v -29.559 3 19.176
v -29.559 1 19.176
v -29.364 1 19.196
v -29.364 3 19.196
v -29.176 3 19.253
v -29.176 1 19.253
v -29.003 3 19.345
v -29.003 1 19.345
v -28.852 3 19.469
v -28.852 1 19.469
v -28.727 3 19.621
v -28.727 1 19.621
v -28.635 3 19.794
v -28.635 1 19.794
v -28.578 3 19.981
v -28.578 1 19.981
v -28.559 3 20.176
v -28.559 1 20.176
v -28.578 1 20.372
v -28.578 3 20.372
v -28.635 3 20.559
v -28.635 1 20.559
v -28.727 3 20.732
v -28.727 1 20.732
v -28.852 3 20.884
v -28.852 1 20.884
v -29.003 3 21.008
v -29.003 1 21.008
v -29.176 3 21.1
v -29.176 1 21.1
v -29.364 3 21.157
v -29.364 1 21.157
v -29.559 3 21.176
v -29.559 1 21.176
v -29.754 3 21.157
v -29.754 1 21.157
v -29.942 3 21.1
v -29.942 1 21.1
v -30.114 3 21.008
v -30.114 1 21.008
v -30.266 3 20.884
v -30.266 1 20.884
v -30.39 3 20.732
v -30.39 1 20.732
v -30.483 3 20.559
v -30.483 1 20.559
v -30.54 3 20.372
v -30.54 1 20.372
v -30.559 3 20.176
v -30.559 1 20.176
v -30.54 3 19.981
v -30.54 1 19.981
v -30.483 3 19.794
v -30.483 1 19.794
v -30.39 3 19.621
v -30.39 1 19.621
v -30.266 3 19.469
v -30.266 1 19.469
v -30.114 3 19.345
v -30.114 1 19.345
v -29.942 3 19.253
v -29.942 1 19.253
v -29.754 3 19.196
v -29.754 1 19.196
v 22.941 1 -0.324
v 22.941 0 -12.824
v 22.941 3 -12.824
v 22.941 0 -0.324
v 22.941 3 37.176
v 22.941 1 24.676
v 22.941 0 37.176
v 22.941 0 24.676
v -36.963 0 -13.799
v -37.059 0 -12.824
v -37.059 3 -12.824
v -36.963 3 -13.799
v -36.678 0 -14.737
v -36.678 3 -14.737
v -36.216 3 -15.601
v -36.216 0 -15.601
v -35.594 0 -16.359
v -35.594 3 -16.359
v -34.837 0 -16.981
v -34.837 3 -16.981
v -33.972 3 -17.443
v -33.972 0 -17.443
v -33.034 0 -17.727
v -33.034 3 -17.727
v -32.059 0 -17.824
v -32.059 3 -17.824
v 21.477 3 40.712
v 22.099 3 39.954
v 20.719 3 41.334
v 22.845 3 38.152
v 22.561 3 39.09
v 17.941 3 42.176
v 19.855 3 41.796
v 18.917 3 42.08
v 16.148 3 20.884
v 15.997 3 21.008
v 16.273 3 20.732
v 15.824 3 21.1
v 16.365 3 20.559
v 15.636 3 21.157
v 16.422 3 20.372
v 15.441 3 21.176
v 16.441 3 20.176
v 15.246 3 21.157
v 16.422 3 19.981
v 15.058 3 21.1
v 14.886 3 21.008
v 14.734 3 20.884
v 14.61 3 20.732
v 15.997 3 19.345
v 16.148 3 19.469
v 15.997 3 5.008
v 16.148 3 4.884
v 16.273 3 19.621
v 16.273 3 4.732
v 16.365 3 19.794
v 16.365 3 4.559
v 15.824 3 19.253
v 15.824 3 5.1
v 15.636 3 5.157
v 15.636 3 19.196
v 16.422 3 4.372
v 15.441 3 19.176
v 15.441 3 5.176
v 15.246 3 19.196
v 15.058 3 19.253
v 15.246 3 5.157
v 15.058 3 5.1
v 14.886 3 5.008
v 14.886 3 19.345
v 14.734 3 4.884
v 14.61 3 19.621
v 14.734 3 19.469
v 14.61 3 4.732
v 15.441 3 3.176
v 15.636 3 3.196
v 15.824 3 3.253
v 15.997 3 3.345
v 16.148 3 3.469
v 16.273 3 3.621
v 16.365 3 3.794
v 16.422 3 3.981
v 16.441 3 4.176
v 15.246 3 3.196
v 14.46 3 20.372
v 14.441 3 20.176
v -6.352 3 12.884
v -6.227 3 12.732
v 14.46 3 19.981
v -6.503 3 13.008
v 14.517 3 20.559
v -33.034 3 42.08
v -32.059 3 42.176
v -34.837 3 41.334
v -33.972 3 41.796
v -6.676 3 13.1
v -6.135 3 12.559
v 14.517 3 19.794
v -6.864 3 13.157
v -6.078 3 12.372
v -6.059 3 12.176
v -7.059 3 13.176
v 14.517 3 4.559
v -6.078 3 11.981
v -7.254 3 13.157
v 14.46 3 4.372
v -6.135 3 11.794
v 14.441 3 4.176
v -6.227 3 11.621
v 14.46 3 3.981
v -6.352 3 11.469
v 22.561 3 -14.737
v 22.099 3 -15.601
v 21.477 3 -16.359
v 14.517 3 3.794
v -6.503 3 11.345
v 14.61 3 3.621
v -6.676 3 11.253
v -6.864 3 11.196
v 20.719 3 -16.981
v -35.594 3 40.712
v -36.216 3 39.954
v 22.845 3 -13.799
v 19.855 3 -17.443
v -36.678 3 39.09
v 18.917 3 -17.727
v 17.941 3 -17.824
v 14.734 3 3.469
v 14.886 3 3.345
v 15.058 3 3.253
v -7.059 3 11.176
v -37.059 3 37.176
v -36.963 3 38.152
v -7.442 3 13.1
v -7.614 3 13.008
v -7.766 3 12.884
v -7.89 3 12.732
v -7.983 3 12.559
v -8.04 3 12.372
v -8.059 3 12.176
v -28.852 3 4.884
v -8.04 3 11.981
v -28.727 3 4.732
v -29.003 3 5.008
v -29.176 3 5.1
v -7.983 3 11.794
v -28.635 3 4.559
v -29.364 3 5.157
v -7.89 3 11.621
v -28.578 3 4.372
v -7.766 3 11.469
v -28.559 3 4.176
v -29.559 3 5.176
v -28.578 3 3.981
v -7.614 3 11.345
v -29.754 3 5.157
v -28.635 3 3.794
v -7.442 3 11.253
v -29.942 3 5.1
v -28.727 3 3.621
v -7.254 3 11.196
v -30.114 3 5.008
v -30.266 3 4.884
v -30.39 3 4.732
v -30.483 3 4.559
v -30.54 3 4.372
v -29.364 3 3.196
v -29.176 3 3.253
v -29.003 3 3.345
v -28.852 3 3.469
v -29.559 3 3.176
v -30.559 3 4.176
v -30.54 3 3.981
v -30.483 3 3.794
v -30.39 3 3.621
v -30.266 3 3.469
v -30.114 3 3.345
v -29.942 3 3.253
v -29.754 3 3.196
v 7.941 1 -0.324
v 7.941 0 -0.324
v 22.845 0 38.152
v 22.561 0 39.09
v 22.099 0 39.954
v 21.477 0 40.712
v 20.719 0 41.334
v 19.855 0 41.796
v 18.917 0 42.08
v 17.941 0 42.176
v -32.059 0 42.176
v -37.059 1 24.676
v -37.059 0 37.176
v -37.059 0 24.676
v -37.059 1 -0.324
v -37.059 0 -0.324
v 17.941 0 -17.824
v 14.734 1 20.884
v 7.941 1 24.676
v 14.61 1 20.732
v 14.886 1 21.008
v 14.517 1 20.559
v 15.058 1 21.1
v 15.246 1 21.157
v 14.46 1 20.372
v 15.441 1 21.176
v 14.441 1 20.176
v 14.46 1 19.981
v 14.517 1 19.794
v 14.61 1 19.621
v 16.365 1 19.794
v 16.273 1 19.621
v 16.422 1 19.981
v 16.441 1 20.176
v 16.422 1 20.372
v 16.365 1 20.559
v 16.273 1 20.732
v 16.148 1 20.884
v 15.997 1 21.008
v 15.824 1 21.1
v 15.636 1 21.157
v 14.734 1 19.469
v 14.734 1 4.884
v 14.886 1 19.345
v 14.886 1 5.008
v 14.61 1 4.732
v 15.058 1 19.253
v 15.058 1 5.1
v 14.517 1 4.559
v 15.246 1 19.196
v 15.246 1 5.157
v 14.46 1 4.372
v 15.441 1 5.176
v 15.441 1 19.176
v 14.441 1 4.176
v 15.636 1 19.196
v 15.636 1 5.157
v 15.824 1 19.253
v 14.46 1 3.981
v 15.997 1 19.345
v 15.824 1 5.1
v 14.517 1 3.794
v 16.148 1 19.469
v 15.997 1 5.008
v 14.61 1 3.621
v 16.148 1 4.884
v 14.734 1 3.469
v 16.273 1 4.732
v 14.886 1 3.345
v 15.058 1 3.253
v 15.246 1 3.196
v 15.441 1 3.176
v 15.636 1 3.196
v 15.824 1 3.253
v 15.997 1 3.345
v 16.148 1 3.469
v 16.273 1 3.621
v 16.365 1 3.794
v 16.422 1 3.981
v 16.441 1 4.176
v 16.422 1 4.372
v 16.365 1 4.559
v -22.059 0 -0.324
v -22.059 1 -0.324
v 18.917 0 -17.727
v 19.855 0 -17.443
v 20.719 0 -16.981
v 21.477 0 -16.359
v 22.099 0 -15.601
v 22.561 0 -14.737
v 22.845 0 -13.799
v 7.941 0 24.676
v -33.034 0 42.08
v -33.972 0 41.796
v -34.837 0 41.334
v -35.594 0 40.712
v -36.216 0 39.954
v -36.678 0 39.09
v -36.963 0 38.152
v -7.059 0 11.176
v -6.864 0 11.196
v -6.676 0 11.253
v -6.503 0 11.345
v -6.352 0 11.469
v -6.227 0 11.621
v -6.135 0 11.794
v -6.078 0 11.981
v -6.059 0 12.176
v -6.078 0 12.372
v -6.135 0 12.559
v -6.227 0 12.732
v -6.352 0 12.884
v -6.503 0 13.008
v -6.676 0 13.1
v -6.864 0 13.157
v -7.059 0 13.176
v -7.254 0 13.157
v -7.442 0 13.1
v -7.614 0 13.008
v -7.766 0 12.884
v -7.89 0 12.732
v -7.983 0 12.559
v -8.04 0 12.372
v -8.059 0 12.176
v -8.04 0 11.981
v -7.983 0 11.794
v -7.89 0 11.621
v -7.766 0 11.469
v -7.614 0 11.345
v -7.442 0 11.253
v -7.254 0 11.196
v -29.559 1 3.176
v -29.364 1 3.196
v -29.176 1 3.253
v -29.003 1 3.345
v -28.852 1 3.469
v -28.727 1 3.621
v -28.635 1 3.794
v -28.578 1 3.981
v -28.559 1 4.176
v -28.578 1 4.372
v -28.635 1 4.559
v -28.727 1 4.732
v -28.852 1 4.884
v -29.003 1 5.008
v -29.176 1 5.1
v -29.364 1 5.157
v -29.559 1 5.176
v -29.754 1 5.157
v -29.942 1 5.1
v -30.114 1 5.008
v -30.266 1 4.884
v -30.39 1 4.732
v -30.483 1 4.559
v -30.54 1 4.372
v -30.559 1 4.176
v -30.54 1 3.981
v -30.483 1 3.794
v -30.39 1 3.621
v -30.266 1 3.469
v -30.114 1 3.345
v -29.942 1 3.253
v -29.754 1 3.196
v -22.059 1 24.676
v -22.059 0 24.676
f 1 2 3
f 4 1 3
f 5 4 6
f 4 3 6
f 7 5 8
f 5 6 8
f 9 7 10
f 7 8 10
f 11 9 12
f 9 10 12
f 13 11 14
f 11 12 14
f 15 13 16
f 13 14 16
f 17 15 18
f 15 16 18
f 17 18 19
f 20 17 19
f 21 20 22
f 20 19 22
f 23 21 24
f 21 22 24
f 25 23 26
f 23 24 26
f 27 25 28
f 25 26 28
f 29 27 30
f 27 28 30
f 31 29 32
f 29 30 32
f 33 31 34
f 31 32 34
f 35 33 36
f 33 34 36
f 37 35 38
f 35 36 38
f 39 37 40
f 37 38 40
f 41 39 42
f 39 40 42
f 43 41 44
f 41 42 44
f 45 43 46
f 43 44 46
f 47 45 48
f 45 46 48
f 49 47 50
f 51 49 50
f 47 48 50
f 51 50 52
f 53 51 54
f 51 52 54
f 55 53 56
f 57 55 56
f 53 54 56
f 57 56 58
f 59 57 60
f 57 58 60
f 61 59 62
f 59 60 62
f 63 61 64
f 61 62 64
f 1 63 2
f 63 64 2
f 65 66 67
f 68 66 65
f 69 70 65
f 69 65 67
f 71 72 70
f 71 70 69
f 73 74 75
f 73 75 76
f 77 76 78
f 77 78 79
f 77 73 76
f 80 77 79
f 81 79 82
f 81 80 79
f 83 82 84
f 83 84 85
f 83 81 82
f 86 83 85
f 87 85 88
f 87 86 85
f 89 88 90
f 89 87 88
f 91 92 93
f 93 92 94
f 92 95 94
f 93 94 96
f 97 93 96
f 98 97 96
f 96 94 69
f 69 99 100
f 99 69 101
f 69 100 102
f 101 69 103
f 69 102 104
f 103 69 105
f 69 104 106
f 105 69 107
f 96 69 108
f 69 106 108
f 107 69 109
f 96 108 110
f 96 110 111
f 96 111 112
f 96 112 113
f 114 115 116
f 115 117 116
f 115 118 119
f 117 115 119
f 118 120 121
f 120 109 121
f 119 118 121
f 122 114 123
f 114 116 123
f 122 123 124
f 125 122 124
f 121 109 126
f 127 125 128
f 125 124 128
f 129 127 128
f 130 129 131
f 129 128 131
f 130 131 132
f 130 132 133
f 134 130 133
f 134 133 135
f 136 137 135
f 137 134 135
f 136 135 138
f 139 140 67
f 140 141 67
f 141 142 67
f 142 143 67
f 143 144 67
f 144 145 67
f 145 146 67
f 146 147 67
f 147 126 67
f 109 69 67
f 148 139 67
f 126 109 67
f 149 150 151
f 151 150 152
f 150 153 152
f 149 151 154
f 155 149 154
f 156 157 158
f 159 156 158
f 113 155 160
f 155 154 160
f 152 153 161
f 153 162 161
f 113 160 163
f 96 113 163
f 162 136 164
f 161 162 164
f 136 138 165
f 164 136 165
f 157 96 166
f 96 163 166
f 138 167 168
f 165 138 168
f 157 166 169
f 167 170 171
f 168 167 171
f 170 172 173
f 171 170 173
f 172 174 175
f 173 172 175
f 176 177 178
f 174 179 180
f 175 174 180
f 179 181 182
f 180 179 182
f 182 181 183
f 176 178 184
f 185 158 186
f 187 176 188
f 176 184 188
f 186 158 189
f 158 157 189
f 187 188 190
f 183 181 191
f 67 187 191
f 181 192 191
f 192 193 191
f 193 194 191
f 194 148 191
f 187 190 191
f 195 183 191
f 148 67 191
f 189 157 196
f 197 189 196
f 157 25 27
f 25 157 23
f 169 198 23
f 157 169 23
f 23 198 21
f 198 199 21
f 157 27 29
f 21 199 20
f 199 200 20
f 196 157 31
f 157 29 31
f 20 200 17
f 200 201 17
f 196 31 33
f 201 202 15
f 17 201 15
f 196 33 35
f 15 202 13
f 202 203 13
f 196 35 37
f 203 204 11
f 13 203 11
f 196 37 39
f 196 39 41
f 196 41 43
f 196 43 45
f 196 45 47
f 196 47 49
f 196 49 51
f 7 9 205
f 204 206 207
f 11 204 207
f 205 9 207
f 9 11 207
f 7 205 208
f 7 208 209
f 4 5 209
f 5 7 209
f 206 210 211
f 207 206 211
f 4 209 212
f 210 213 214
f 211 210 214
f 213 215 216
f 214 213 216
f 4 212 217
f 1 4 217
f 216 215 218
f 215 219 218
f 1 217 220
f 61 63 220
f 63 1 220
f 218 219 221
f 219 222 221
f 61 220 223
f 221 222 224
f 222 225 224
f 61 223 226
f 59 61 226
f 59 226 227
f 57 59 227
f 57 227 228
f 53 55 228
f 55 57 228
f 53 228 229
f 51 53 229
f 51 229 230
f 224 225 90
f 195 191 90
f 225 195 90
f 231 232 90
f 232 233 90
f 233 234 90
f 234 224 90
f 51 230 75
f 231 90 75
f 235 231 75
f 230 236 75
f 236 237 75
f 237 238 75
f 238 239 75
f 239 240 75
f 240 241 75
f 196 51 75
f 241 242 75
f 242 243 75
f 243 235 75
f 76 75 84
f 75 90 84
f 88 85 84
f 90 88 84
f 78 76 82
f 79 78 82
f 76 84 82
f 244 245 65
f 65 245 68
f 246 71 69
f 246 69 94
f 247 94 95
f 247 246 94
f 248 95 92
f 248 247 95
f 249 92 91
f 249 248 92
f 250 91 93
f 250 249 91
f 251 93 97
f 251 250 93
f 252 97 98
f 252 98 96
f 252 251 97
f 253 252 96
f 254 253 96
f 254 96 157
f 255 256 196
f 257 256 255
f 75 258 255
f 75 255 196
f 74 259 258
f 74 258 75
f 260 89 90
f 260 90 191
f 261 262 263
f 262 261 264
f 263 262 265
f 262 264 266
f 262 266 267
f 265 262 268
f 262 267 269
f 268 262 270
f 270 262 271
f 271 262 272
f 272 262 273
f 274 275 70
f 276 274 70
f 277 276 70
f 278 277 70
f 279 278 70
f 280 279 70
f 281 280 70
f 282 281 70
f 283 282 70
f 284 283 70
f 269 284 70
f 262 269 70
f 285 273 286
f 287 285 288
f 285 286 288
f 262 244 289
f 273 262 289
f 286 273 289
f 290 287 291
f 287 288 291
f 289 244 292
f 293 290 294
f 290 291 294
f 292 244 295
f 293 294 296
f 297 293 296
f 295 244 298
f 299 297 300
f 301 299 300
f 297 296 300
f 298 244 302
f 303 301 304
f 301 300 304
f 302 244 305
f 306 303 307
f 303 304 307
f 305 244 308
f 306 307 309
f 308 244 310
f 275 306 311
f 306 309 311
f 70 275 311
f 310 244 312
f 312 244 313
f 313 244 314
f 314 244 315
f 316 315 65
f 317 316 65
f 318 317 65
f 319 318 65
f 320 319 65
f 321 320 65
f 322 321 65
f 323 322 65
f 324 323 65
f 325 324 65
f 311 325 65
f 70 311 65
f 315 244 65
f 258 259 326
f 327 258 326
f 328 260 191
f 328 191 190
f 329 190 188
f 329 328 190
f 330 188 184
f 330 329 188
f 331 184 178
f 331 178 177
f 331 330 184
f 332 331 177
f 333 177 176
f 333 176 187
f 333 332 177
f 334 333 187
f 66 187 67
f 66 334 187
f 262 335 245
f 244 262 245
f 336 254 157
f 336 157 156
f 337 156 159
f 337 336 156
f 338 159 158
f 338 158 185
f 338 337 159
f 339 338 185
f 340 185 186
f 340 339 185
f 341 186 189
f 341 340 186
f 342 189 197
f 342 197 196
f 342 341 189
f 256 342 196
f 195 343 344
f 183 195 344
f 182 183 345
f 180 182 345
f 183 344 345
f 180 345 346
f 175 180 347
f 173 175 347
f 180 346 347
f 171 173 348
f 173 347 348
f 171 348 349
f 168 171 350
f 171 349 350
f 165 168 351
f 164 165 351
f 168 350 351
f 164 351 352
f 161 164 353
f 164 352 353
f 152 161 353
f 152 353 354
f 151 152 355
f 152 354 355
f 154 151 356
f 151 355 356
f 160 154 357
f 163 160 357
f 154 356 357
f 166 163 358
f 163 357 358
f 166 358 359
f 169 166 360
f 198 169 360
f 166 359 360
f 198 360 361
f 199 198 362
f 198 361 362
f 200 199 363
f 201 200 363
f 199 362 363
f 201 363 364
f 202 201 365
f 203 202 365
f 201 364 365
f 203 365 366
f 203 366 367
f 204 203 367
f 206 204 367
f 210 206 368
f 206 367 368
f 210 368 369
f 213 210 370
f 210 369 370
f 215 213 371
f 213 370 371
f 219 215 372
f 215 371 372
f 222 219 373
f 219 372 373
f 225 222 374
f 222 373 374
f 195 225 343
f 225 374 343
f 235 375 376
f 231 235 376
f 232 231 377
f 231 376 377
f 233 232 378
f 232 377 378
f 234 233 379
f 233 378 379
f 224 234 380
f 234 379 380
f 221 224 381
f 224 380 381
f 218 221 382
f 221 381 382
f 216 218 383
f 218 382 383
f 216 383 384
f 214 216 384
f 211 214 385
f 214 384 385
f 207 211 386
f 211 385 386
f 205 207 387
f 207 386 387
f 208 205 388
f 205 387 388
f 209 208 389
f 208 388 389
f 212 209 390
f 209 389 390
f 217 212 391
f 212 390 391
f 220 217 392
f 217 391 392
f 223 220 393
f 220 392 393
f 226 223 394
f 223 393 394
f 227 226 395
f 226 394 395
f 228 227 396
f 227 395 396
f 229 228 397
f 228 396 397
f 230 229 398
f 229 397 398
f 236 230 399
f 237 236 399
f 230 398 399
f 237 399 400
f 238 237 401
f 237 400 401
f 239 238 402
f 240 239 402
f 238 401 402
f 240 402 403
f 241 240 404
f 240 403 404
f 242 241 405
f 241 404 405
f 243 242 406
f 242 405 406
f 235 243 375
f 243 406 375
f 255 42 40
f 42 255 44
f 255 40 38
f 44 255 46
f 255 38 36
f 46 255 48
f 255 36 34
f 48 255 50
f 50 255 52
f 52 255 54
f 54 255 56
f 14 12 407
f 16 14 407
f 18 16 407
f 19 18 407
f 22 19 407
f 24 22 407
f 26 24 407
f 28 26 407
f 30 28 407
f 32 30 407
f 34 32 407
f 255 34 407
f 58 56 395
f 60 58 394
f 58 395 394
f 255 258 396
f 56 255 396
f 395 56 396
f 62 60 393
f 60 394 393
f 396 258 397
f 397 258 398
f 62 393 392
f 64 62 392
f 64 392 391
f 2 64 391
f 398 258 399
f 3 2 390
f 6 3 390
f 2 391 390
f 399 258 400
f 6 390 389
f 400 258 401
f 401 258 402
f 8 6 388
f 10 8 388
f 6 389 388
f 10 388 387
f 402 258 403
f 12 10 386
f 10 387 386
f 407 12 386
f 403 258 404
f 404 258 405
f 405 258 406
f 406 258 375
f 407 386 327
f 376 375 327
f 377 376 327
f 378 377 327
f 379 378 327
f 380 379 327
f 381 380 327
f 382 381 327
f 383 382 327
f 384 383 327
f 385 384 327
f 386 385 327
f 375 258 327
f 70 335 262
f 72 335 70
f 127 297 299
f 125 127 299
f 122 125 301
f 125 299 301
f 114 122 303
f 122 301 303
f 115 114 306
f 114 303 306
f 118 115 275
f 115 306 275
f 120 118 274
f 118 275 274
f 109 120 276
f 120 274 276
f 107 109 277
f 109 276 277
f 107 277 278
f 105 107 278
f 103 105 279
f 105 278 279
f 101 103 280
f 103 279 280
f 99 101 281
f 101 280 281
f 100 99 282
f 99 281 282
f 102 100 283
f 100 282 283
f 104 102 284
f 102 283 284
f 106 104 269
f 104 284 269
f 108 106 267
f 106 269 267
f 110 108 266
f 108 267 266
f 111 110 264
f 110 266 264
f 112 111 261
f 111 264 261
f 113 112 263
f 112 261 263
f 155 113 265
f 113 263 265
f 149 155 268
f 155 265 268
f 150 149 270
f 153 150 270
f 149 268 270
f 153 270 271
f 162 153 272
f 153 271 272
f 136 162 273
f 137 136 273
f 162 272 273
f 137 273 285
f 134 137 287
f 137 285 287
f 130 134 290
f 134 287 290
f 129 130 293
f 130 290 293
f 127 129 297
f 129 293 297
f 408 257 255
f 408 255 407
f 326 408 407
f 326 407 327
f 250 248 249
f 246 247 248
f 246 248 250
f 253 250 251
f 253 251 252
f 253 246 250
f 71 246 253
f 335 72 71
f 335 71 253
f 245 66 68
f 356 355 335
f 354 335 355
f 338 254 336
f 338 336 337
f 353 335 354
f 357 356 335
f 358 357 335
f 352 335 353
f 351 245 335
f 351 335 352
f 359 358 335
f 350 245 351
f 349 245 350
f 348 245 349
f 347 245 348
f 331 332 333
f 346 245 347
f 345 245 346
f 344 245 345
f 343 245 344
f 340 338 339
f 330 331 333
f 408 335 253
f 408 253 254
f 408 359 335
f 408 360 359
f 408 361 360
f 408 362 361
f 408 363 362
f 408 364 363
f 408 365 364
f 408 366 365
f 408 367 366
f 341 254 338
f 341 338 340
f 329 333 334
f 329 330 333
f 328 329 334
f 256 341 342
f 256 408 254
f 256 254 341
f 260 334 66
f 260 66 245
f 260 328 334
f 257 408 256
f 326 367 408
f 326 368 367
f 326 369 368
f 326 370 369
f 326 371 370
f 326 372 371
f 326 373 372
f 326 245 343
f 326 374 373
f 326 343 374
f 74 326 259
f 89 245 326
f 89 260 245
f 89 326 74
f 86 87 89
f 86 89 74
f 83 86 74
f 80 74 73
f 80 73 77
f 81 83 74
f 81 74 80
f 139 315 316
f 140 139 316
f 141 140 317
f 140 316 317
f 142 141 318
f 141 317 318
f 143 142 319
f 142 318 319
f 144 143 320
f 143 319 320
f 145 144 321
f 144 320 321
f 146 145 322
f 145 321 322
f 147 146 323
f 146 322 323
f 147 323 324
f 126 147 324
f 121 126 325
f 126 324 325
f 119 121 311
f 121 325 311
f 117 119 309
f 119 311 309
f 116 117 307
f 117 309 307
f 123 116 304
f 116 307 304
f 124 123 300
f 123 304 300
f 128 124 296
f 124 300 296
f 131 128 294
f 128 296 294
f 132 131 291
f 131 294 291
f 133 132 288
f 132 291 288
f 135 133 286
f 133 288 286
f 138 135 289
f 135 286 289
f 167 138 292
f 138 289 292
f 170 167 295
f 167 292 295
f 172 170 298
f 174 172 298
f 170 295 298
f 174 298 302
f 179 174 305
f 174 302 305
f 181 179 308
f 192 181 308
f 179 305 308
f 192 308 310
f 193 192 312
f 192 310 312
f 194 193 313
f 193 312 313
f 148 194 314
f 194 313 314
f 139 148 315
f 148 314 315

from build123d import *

# Parameters (mm, degrees)
BOSS_EXTRUDE1_DEPTH = 3
SKETCH2_W           = 15
SKETCH2_H           = 25
CUT_EXTRUDE1_DEPTH  = 1
SKETCH3_R           = 1
CUT_EXTRUDE2_DEPTH  = 2
SKETCH4_R           = 1
CUT_EXTRUDE4_DEPTH  = 3


with BuildPart() as part:
    # Sketch1 → Boss-Extrude1 (new body)
    with BuildSketch(Plane(origin=(0, 0, 0), x_dir=(1, 0, 0), z_dir=(0, 1, 0))):
        with BuildLine():
            Line((-32.058823529, 17.823529412), (17.941176471, 17.823529412))
            ThreePointArc((17.941176471, 17.823529412), (21.476710377, 16.359063318), (22.941176471, 12.823529412))
            Line((22.941176471, 12.823529412), (22.941176471, -37.176470588))
            ThreePointArc((22.941176471, -37.176470588), (21.476710377, -40.712004494), (17.941176471, -42.176470588))
            Line((17.941176471, -42.176470588), (-32.058823529, -42.176470588))
            ThreePointArc((-32.058823529, -42.176470588), (-35.594357435, -40.712004494), (-37.058823529, -37.176470588))
            Line((-37.058823529, -37.176470588), (-37.058823529, 12.823529412))
            ThreePointArc((-37.058823529, 12.823529412), (-35.594357435, 16.359063318), (-32.058823529, 17.823529412))
        make_face()
    extrude(amount=BOSS_EXTRUDE1_DEPTH)

    # Sketch2 → Cut-Extrude1 (cut)
    with BuildSketch(Plane(origin=(0, 0, 0), x_dir=(1, 0, 0), z_dir=(0, 1, 0))):
        with Locations((-29.558823529, -12.176470588)):
            Rectangle(SKETCH2_W, SKETCH2_H)
        with Locations((15.441176471, -12.176470588)):
            Rectangle(SKETCH2_W, SKETCH2_H)
    extrude(amount=CUT_EXTRUDE1_DEPTH, mode=Mode.SUBTRACT)

    # Sketch3 → Cut-Extrude2 (cut)
    with BuildSketch(Plane(origin=(0, 1, 0), x_dir=(-1, 0, 0), z_dir=(0, -1, 0))):
        with Locations(Location((29.558823529, -20.176470588, 0), (0, 0, 90))):
            Circle(SKETCH3_R)
        with Locations(Location((29.558823529, -4.176470588, 0), (0, 0, 90))):
            Circle(SKETCH3_R)
        with Locations(Location((-15.441176471, -20.176470588, 0), (0, 0, 90))):
            Circle(SKETCH3_R)
        with Locations(Location((-15.441176471, -4.176470588, 0), (0, 0, 90))):
            Circle(SKETCH3_R)
    extrude(amount=-CUT_EXTRUDE2_DEPTH, mode=Mode.SUBTRACT)

    # Sketch4 → Cut-Extrude4 (cut)
    with BuildSketch(Plane(origin=(0, 0, 0), x_dir=(-1, 0, 0), z_dir=(0, -1, 0))):
        with Locations(Location((7.058823529, -12.176470588, 0), (0, 0, 90))):
            Circle(SKETCH4_R)
    extrude(amount=-CUT_EXTRUDE4_DEPTH, mode=Mode.SUBTRACT)


solid = part.part
